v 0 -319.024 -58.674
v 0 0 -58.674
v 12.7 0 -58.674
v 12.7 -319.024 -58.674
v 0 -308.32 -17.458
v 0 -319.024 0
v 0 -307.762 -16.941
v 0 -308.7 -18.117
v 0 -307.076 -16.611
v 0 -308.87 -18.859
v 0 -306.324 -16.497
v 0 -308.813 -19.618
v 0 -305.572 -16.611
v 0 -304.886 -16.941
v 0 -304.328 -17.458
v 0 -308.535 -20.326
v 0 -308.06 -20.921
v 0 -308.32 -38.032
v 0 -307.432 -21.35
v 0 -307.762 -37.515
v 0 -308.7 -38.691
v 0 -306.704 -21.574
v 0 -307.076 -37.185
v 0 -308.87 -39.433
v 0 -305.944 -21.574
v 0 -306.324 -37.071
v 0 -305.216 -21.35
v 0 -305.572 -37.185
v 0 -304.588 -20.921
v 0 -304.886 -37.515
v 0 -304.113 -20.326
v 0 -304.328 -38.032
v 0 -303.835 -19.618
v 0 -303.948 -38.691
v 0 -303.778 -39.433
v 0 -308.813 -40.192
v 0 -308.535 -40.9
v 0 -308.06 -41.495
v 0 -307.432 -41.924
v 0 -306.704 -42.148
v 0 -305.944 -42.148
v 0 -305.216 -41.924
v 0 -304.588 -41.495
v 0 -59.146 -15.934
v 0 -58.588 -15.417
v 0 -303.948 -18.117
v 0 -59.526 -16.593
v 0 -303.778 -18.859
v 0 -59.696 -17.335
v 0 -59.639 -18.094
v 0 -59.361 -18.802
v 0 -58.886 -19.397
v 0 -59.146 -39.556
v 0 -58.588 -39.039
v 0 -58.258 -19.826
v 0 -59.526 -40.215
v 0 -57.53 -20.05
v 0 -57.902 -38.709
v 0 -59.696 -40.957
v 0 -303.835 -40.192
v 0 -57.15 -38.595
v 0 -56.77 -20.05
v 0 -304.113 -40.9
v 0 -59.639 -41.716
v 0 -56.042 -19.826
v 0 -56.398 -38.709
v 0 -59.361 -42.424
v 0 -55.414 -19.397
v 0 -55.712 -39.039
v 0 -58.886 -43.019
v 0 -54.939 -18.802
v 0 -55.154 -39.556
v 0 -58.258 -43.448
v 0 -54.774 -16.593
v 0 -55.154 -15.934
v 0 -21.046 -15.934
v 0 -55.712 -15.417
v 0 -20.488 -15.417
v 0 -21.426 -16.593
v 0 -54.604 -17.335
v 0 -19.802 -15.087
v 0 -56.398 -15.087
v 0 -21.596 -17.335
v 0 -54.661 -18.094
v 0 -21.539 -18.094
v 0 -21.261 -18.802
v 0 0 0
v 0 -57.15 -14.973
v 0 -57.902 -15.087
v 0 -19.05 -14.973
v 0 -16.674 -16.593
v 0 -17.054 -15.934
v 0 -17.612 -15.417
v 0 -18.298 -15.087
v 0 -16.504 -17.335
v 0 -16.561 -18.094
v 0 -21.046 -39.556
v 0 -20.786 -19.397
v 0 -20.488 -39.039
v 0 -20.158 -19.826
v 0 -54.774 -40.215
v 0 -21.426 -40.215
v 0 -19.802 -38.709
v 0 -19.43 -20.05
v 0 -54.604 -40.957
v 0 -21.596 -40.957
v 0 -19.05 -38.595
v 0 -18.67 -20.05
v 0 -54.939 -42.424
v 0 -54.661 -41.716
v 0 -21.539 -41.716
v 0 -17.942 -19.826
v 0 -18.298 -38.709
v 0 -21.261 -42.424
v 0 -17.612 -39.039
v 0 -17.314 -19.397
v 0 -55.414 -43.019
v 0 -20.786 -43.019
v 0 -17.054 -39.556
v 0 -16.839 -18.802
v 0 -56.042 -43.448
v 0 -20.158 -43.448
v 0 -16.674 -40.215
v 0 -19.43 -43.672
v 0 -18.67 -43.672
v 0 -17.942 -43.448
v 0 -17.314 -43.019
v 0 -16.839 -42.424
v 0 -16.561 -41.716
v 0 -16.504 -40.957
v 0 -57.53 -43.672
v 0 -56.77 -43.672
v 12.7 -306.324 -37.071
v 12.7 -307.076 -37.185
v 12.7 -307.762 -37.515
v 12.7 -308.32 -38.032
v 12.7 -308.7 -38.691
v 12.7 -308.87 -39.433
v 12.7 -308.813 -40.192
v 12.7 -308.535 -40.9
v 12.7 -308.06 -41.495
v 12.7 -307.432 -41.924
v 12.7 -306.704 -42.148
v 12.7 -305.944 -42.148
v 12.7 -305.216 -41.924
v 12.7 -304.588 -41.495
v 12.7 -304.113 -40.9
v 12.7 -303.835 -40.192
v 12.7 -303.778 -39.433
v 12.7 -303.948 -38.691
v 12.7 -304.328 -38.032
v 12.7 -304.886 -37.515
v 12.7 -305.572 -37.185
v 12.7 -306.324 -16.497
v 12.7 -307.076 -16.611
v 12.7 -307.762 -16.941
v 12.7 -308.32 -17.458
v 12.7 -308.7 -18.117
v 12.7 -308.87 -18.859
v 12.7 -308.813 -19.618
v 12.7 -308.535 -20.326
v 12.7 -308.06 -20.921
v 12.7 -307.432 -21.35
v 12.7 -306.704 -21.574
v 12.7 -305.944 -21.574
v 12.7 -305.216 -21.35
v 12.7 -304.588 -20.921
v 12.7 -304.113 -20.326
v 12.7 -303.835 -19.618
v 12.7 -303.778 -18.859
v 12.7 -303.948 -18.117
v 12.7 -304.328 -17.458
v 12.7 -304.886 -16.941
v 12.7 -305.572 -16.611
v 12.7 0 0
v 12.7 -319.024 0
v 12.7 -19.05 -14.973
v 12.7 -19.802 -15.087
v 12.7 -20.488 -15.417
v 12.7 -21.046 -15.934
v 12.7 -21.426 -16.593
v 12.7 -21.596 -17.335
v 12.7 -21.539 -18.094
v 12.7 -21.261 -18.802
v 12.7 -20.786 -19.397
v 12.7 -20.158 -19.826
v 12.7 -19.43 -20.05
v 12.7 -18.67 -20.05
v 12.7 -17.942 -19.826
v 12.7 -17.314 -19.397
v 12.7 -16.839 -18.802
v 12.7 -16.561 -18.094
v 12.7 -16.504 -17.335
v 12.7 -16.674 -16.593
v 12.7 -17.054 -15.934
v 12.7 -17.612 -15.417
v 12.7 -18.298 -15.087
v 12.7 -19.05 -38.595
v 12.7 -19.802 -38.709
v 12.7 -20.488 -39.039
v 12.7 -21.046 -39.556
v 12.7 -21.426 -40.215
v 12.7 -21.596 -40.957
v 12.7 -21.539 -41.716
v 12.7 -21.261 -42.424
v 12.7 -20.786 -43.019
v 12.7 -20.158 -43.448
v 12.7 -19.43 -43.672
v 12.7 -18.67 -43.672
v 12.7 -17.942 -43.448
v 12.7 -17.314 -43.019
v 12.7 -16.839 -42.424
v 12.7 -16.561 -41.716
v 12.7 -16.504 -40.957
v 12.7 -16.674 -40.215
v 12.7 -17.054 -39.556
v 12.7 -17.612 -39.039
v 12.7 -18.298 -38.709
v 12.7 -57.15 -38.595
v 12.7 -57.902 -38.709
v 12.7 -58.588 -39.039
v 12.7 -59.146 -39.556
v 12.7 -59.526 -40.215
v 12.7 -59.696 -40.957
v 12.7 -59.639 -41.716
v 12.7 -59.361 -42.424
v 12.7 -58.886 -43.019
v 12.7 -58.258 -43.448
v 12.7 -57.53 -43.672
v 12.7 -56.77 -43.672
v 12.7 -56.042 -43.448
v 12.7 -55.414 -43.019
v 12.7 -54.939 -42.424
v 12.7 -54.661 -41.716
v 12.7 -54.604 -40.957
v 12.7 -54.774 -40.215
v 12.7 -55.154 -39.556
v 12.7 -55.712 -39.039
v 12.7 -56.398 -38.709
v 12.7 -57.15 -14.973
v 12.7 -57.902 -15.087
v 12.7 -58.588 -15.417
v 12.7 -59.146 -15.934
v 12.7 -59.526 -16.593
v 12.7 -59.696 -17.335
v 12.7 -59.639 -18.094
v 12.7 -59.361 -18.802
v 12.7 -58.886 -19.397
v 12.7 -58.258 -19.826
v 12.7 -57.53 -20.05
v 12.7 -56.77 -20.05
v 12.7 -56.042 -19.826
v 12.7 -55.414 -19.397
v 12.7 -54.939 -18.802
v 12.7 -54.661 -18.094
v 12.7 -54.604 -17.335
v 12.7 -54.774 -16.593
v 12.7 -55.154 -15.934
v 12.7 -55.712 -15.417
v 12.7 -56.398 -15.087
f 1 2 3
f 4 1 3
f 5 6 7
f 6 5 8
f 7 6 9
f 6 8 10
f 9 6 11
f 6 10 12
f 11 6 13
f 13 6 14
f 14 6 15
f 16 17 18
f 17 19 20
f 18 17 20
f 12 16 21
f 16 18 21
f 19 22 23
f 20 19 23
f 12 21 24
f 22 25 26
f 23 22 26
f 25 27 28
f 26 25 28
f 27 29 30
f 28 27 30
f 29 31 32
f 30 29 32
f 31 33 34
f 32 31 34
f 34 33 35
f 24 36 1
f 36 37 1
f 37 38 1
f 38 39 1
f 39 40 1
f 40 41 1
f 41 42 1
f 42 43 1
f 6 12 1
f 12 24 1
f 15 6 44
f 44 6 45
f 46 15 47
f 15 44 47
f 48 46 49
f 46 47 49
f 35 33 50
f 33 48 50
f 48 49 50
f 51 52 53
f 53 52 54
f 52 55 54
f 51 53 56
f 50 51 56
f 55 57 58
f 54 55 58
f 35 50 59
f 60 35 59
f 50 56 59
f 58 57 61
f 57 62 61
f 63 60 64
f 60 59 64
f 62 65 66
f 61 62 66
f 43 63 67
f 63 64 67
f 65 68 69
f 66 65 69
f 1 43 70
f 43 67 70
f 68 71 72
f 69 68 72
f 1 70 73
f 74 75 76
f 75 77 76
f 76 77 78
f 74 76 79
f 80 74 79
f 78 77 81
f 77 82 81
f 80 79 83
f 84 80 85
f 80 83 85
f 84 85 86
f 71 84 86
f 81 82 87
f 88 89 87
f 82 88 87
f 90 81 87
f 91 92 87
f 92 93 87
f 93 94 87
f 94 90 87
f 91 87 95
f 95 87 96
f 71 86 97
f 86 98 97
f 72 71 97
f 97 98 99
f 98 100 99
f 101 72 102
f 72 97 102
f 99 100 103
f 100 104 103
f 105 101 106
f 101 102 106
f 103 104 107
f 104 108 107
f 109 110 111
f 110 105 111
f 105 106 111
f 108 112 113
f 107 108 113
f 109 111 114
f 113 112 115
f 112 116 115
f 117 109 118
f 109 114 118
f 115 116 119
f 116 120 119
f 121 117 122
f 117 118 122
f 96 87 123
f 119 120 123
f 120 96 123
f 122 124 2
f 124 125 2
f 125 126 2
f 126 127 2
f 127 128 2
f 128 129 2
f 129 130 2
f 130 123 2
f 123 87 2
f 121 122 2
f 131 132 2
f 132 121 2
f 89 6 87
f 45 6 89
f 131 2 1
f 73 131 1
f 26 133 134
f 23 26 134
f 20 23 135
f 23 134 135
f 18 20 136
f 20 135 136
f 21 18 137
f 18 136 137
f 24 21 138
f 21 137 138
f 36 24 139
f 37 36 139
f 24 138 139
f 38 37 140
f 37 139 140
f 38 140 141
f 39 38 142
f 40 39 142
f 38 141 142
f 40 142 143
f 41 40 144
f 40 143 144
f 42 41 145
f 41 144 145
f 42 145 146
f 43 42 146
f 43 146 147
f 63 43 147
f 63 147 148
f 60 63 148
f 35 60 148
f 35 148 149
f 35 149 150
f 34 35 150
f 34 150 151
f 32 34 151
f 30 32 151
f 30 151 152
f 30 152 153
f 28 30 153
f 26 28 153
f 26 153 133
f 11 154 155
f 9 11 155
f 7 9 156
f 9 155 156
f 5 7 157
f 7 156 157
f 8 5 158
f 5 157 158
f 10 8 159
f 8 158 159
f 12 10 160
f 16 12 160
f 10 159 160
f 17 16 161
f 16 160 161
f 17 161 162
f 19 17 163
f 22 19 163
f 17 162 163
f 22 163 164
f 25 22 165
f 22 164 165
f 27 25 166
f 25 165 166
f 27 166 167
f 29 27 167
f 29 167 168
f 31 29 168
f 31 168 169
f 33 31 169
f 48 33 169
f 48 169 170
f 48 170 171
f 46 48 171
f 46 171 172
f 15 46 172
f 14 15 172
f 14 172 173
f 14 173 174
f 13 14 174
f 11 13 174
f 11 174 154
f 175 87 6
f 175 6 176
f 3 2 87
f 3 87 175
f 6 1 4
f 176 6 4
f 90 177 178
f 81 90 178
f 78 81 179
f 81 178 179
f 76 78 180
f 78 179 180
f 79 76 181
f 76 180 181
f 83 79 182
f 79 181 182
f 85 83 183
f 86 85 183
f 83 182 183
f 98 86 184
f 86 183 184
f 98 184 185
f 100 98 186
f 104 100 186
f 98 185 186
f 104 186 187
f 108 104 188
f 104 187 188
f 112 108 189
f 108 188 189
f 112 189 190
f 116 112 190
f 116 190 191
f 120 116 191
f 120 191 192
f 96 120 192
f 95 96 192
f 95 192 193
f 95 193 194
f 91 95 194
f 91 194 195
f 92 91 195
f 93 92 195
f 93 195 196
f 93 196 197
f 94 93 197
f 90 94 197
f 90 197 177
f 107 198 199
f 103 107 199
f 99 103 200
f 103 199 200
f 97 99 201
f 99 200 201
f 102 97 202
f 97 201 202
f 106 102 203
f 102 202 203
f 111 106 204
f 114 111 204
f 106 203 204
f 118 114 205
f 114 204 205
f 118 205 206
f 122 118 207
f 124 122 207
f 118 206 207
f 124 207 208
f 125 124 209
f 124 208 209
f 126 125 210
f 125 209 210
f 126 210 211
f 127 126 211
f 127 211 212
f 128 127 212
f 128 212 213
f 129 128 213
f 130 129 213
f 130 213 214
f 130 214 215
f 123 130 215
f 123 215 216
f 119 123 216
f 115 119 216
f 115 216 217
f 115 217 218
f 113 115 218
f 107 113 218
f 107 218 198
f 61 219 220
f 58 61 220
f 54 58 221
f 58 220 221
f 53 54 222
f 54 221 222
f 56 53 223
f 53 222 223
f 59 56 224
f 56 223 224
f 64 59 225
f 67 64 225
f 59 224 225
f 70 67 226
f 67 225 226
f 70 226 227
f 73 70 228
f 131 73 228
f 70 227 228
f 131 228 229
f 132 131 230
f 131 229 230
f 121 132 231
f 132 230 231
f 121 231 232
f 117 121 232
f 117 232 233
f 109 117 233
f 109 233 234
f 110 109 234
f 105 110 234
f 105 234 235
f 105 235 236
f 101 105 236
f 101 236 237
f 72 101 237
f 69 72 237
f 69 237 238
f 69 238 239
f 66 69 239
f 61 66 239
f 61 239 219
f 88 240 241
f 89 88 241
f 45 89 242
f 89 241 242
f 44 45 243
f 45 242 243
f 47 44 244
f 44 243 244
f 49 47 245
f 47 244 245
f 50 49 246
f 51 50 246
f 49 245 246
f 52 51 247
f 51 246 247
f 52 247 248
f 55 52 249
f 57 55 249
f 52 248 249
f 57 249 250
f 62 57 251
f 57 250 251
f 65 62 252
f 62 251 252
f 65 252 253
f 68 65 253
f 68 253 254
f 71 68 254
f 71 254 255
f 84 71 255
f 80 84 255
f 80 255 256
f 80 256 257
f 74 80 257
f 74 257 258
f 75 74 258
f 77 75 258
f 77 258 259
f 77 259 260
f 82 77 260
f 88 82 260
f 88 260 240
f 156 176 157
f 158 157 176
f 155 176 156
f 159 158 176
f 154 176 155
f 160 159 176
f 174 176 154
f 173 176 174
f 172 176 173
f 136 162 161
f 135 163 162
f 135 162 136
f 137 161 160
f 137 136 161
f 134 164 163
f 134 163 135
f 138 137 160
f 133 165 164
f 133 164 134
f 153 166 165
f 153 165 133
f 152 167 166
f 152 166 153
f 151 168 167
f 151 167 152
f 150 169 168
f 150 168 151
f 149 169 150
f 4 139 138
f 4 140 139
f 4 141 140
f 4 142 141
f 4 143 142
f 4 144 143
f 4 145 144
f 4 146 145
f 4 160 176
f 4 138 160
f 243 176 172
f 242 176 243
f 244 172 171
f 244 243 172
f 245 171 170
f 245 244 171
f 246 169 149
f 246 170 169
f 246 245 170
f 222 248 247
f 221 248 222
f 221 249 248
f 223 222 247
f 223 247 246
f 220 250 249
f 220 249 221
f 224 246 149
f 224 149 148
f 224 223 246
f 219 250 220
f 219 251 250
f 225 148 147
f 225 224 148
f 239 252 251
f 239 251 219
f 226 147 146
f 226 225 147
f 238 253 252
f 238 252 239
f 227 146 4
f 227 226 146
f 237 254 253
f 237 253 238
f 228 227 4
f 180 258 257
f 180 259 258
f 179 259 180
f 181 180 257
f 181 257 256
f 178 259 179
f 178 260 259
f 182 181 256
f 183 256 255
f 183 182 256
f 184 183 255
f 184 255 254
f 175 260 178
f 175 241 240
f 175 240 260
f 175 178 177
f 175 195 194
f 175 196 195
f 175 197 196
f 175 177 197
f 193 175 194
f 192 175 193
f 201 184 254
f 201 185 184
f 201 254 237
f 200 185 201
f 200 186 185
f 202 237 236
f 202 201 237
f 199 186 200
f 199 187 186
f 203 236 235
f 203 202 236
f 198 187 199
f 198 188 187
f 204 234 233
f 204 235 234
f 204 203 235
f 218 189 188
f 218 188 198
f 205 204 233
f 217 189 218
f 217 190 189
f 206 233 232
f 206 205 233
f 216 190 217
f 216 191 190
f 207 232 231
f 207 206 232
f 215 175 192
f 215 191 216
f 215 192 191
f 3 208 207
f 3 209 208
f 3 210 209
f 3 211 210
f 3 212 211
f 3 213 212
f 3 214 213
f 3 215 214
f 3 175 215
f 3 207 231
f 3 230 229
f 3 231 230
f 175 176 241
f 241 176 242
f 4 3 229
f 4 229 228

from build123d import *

# Parameters (mm, degrees)
SKETCH1_W               = 12.7
SKETCH1_H               = 58.674
BOSS_EXTRUDE1_DEPTH     = 319.024
F_1_4_20_TAPPED_HOLE1_D = 5.1054


with BuildPart() as part:
    # Sketch1 → Boss-Extrude1 (new body)
    with BuildSketch(Plane(origin=(0, 0, 0), x_dir=(1, 0, 0), z_dir=(0, 1, 0))):
        with Locations((6.35, 29.337)):
            Rectangle(SKETCH1_W, SKETCH1_H)
    extrude(amount=-BOSS_EXTRUDE1_DEPTH)

    # 1/4-20 Tapped Hole1 (through all)
    with Locations(Plane(origin=(0, -306.324, -19.05), x_dir=(0, 0, -1), z_dir=(-1, 0, 0))):
        with Locations((0, 0), (20.574, 0), (22.098, -287.274), (-1.524, -287.274), (22.098, -249.174), (-1.524, -249.174)):
            Hole(F_1_4_20_TAPPED_HOLE1_D / 2)


solid = part.part
